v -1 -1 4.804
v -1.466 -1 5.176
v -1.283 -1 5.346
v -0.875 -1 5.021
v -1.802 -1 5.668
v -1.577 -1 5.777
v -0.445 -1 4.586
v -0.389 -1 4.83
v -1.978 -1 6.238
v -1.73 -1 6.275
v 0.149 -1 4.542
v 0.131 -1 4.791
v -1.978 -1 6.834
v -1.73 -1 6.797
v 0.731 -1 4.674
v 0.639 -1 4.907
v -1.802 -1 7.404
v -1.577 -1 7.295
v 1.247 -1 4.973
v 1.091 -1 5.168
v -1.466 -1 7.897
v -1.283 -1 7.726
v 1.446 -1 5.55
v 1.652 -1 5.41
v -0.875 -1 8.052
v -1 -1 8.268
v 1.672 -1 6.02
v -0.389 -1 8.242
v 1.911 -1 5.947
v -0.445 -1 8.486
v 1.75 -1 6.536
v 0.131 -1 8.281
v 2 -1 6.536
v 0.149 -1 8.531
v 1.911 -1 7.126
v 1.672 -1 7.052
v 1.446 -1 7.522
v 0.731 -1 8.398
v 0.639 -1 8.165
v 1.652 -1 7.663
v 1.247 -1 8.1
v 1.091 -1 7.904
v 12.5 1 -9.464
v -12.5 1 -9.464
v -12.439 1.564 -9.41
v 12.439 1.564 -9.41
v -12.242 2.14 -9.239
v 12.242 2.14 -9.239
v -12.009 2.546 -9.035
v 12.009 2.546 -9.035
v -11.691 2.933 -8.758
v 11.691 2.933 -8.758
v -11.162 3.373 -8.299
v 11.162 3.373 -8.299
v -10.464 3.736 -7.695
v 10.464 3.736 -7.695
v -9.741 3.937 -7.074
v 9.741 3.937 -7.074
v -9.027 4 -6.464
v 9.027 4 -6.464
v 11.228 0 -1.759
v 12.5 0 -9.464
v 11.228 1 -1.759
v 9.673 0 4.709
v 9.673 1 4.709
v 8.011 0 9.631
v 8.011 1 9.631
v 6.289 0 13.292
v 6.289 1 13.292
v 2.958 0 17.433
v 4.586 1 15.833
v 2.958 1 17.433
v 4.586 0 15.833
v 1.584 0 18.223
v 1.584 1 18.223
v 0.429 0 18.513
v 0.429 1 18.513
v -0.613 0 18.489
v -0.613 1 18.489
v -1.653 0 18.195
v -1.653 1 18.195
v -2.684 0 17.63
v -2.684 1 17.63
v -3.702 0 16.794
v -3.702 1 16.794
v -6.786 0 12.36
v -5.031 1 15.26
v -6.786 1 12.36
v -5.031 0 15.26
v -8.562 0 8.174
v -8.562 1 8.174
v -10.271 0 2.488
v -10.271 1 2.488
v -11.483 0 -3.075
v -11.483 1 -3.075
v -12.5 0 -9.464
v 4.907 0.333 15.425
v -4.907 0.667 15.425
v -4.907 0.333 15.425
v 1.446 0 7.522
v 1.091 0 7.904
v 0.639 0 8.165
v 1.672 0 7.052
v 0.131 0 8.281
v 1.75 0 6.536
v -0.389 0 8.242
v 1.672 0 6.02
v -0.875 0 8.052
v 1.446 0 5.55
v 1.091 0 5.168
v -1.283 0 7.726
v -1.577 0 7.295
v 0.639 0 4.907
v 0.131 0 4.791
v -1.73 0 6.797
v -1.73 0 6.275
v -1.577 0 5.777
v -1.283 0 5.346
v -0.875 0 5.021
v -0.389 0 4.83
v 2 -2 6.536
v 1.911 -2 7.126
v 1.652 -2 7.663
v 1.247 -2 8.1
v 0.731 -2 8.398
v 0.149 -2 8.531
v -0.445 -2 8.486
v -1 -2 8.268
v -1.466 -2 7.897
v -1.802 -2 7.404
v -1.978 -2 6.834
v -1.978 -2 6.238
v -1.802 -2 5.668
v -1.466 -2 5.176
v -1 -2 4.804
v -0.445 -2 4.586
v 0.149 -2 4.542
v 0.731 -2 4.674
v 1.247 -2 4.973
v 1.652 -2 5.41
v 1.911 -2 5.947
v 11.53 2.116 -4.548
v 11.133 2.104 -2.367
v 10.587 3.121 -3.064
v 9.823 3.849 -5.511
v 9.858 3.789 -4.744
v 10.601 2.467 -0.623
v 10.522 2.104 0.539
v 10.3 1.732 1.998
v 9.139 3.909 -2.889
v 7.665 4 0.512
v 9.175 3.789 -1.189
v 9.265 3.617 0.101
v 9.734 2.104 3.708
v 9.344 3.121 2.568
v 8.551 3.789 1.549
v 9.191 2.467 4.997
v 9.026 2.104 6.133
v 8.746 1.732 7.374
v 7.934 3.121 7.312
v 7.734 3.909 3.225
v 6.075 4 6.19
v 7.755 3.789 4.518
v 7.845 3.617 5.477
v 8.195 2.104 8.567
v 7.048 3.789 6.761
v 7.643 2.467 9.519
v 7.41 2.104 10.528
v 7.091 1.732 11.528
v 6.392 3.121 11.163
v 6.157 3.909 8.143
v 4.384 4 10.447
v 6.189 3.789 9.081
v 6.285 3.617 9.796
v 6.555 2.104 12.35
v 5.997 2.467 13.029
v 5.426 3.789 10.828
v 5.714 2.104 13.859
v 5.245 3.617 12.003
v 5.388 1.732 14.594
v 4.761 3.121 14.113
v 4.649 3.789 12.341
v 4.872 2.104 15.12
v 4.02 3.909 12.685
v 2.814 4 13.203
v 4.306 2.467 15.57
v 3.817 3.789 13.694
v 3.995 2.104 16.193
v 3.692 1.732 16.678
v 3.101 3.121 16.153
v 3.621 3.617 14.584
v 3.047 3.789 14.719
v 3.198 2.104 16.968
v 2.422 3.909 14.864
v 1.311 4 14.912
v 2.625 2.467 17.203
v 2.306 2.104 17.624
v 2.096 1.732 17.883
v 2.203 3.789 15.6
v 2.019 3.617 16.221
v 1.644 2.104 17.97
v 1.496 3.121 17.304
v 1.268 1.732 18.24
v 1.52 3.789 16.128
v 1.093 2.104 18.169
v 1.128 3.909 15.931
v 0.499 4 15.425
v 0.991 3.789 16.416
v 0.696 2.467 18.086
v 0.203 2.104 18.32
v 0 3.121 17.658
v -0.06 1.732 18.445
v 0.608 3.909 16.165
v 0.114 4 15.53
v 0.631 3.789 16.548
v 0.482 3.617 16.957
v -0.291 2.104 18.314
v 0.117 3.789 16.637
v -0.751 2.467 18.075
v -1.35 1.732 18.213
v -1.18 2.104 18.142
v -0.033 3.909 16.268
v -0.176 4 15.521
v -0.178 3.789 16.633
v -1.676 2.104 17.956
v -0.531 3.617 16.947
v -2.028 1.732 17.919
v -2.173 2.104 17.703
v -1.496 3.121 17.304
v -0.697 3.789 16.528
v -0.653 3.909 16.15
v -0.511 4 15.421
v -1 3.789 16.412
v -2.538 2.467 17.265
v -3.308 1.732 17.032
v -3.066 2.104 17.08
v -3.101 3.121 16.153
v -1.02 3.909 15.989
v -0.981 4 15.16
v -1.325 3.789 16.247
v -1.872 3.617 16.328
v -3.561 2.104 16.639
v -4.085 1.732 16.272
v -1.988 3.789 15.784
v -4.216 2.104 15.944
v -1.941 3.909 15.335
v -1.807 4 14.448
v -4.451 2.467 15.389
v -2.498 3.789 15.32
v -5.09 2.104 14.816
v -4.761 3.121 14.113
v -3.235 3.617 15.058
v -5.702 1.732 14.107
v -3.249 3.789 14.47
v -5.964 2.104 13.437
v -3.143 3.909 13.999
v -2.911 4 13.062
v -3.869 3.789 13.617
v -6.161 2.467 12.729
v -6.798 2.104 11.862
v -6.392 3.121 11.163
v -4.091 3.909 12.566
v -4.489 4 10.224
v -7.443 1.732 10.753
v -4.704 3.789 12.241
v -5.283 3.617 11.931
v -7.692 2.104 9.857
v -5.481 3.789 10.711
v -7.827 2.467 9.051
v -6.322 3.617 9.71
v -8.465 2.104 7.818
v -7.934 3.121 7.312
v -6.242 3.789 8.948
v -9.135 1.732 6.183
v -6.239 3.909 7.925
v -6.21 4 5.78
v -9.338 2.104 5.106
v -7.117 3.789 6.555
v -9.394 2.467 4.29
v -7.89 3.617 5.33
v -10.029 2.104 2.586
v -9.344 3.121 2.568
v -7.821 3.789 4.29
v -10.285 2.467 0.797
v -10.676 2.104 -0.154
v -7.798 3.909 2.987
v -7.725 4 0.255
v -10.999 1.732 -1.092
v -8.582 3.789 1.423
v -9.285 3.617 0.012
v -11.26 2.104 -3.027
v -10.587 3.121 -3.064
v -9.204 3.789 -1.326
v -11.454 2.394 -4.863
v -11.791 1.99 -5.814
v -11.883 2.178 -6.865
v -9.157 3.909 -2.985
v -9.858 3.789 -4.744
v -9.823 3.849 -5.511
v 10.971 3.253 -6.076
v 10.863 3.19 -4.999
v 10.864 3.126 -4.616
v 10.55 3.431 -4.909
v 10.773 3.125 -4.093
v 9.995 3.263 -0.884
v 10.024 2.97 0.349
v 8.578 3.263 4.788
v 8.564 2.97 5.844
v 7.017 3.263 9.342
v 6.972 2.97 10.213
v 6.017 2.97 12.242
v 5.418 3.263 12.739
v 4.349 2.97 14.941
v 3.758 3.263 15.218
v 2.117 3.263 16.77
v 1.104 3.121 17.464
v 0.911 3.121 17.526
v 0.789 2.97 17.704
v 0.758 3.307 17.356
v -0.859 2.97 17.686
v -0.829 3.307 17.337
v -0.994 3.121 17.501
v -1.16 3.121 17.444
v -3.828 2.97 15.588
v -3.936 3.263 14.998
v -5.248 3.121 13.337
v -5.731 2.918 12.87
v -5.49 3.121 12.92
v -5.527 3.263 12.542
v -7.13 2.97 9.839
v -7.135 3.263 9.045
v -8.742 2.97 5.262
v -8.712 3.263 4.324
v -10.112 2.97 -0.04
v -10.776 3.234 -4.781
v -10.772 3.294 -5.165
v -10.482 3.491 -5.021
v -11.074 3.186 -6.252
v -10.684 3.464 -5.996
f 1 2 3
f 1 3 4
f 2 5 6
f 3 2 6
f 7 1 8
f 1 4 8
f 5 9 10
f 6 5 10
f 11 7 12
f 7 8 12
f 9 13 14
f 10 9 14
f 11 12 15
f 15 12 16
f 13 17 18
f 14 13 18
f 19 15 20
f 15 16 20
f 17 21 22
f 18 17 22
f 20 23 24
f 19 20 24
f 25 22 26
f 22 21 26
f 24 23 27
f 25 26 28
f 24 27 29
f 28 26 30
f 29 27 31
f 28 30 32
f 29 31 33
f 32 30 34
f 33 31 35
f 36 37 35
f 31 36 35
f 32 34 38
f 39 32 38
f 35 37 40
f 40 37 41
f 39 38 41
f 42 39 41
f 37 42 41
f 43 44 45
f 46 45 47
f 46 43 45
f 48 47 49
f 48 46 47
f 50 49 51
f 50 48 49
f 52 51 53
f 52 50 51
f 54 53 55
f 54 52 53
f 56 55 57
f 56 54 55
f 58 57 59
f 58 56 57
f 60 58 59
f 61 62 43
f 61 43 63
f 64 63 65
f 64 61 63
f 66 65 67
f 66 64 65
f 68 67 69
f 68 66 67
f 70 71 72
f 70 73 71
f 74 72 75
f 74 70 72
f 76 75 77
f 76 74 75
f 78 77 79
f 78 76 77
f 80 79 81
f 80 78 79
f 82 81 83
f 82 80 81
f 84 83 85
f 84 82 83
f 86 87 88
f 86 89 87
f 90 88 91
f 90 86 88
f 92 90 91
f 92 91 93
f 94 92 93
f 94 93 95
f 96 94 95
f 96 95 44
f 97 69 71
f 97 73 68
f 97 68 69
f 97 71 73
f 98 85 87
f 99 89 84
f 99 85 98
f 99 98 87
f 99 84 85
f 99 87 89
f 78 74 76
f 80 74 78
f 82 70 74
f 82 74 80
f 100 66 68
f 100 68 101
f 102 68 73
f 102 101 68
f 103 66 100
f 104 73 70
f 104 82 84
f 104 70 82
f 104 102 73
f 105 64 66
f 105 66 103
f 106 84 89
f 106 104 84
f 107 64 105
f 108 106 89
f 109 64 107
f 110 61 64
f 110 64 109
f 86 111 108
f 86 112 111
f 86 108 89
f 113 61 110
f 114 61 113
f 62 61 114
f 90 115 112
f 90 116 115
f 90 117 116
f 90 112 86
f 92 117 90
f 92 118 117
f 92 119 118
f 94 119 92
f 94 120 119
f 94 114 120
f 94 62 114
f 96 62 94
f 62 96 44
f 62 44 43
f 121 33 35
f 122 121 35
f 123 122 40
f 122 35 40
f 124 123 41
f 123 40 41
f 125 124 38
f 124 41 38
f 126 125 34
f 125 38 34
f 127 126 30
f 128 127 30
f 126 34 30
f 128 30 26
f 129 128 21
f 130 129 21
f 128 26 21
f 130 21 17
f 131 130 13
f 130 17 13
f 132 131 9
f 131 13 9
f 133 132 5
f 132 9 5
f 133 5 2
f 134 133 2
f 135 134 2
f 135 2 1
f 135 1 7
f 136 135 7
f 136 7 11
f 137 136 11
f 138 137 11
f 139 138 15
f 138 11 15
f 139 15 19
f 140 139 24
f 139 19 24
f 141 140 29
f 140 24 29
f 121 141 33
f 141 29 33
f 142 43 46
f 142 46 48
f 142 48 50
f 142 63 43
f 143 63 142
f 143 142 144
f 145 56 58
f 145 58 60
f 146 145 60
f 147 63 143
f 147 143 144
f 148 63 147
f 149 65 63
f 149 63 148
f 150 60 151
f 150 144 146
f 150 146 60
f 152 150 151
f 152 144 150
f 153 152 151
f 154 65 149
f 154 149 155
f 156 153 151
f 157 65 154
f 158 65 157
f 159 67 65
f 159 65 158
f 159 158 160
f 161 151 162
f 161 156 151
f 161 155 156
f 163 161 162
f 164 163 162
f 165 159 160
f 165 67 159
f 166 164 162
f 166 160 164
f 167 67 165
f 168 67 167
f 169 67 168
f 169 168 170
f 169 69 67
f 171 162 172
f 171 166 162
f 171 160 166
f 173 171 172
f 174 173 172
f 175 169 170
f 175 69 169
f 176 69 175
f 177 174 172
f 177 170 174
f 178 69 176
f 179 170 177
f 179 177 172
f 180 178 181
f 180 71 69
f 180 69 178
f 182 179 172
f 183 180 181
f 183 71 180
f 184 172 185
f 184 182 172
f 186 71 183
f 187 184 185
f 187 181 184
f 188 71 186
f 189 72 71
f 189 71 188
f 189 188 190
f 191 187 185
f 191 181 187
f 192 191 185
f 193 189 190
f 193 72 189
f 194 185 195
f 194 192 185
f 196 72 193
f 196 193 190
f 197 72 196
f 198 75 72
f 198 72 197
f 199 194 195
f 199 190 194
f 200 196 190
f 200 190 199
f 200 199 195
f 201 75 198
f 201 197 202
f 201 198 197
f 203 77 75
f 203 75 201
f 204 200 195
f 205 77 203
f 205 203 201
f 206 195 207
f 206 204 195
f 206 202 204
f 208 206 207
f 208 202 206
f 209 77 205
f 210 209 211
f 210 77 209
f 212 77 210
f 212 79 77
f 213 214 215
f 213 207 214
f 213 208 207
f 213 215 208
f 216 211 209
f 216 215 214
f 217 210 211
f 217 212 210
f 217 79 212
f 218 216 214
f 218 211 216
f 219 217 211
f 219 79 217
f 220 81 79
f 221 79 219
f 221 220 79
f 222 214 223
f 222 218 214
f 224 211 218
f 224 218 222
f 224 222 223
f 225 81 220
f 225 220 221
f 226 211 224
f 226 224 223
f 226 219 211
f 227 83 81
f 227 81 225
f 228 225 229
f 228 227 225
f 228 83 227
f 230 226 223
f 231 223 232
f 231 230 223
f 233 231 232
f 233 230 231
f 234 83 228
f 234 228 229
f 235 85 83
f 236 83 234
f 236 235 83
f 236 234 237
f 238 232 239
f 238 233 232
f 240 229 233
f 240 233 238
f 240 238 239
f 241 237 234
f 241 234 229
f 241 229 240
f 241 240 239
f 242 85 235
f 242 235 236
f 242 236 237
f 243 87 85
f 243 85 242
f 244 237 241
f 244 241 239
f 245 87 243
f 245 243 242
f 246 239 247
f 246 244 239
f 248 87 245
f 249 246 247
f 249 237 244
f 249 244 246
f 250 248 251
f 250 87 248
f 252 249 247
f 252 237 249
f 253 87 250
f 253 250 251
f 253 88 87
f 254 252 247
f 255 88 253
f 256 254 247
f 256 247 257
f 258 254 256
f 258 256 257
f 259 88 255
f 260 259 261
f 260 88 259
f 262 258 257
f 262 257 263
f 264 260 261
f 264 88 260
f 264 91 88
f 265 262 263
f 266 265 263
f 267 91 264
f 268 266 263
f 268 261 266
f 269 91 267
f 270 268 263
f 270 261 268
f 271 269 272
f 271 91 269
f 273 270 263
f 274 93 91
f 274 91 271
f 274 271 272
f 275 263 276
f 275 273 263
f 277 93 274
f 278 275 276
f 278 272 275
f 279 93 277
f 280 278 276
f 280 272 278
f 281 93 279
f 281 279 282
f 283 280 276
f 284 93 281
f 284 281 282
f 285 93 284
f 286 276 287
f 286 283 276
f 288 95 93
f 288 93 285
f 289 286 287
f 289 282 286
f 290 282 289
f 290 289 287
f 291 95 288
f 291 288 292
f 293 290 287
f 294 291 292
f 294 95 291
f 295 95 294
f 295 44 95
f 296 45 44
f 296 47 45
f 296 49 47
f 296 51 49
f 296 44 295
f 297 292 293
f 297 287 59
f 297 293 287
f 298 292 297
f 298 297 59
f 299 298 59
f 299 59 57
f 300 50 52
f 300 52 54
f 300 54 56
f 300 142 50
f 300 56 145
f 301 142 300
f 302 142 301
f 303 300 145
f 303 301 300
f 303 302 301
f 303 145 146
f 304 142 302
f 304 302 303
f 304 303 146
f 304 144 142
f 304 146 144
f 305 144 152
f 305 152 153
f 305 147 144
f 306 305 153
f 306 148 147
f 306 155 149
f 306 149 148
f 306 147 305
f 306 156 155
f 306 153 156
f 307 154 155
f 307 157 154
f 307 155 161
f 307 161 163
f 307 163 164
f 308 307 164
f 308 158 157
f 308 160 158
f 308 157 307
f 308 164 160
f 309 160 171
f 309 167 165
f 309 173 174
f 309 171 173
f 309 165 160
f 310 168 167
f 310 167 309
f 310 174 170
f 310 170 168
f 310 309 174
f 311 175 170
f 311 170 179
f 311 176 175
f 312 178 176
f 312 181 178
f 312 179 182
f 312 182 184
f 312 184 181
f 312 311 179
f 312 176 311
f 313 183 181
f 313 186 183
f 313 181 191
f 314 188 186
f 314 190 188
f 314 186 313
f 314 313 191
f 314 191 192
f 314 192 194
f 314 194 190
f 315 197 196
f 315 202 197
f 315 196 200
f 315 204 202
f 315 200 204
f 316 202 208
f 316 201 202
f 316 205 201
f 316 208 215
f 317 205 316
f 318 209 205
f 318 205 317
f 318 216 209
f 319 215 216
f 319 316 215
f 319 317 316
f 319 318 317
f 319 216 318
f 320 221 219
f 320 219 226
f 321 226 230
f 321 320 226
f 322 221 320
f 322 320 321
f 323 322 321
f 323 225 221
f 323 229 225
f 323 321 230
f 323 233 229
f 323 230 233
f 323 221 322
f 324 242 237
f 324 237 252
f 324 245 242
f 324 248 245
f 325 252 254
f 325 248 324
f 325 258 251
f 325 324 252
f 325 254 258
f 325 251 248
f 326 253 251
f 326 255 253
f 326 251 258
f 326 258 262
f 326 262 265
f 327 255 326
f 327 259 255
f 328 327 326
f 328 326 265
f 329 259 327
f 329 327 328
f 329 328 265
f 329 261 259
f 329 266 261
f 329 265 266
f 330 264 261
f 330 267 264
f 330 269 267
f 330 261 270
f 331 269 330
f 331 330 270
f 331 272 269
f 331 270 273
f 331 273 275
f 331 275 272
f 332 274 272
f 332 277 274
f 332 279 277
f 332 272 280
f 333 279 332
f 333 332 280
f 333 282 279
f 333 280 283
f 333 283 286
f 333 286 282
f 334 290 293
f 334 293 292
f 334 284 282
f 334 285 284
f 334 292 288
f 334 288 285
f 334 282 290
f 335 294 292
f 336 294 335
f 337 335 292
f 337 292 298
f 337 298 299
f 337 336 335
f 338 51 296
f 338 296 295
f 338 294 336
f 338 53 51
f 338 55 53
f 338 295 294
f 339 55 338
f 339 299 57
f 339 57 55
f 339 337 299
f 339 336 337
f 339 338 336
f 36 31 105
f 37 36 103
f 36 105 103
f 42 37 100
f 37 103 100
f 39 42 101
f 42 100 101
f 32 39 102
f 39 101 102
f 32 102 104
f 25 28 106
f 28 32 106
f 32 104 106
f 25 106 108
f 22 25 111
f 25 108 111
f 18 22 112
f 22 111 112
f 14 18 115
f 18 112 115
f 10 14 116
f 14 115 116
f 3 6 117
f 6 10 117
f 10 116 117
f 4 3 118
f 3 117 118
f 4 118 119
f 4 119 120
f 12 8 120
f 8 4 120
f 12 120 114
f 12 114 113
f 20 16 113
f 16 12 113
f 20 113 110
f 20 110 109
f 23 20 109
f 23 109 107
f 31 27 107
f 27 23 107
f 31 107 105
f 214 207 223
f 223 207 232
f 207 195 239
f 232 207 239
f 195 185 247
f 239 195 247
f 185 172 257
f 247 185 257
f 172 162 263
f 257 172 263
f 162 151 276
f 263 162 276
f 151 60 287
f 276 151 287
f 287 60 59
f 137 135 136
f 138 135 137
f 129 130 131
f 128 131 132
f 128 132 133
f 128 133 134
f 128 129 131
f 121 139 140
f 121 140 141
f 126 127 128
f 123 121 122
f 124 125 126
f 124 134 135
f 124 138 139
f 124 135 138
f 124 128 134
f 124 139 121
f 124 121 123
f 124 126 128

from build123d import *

# Parameters (mm, degrees)
BOSS_EXTRUDE1_DEPTH = 4
FILLET1_R           = 3
SKETCH2_R           = 1.75
BOSS_EXTRUDE2_DEPTH = 2
BOSS_EXTRUDE3_START = -1
SKETCH3_R           = 2
BOSS_EXTRUDE3_DEPTH = 1


with BuildPart() as part:
    # Sketch1 → Boss-Extrude1 (new body)
    with BuildSketch(Plane(origin=(0, 0, 0), x_dir=(1, 0, 0), z_dir=(0, 1, 0))):
        with BuildLine():
            Line((-12.5, 9.463815789), (12.5, 9.463815789))
            add(Edge.make_bspline(
                [(12.5, 9.463815789), (7.5, -27.869517544), (-7.5, -27.869517544), (-12.5, 9.463815789)],
                knots=[0, 0, 0, 0, 1, 1, 1, 1], degree=3))
        make_face()
    extrude(amount=BOSS_EXTRUDE1_DEPTH)

    # Fillet1
    fillet1_edges = [part.edges().sort_by_distance(p)[0] for p in [
        (0, 4, -9.463815789),
        (0.023803991, 4, 18.536113697),
    ]]
    fillet(fillet1_edges, radius=FILLET1_R)

    # Sketch2 → Boss-Extrude2 (add)
    with BuildSketch(Plane.XZ):
        with Locations((0, 6.536184211)):
            Circle(SKETCH2_R)
    extrude(amount=BOSS_EXTRUDE2_DEPTH)

    # Sketch3 → Boss-Extrude3 (add)
    with BuildSketch(Plane.XZ.offset(2).offset(BOSS_EXTRUDE3_START)):
        with Locations((0, 6.536184211)):
            Circle(SKETCH3_R)
    extrude(amount=BOSS_EXTRUDE3_DEPTH)


solid = part.part
